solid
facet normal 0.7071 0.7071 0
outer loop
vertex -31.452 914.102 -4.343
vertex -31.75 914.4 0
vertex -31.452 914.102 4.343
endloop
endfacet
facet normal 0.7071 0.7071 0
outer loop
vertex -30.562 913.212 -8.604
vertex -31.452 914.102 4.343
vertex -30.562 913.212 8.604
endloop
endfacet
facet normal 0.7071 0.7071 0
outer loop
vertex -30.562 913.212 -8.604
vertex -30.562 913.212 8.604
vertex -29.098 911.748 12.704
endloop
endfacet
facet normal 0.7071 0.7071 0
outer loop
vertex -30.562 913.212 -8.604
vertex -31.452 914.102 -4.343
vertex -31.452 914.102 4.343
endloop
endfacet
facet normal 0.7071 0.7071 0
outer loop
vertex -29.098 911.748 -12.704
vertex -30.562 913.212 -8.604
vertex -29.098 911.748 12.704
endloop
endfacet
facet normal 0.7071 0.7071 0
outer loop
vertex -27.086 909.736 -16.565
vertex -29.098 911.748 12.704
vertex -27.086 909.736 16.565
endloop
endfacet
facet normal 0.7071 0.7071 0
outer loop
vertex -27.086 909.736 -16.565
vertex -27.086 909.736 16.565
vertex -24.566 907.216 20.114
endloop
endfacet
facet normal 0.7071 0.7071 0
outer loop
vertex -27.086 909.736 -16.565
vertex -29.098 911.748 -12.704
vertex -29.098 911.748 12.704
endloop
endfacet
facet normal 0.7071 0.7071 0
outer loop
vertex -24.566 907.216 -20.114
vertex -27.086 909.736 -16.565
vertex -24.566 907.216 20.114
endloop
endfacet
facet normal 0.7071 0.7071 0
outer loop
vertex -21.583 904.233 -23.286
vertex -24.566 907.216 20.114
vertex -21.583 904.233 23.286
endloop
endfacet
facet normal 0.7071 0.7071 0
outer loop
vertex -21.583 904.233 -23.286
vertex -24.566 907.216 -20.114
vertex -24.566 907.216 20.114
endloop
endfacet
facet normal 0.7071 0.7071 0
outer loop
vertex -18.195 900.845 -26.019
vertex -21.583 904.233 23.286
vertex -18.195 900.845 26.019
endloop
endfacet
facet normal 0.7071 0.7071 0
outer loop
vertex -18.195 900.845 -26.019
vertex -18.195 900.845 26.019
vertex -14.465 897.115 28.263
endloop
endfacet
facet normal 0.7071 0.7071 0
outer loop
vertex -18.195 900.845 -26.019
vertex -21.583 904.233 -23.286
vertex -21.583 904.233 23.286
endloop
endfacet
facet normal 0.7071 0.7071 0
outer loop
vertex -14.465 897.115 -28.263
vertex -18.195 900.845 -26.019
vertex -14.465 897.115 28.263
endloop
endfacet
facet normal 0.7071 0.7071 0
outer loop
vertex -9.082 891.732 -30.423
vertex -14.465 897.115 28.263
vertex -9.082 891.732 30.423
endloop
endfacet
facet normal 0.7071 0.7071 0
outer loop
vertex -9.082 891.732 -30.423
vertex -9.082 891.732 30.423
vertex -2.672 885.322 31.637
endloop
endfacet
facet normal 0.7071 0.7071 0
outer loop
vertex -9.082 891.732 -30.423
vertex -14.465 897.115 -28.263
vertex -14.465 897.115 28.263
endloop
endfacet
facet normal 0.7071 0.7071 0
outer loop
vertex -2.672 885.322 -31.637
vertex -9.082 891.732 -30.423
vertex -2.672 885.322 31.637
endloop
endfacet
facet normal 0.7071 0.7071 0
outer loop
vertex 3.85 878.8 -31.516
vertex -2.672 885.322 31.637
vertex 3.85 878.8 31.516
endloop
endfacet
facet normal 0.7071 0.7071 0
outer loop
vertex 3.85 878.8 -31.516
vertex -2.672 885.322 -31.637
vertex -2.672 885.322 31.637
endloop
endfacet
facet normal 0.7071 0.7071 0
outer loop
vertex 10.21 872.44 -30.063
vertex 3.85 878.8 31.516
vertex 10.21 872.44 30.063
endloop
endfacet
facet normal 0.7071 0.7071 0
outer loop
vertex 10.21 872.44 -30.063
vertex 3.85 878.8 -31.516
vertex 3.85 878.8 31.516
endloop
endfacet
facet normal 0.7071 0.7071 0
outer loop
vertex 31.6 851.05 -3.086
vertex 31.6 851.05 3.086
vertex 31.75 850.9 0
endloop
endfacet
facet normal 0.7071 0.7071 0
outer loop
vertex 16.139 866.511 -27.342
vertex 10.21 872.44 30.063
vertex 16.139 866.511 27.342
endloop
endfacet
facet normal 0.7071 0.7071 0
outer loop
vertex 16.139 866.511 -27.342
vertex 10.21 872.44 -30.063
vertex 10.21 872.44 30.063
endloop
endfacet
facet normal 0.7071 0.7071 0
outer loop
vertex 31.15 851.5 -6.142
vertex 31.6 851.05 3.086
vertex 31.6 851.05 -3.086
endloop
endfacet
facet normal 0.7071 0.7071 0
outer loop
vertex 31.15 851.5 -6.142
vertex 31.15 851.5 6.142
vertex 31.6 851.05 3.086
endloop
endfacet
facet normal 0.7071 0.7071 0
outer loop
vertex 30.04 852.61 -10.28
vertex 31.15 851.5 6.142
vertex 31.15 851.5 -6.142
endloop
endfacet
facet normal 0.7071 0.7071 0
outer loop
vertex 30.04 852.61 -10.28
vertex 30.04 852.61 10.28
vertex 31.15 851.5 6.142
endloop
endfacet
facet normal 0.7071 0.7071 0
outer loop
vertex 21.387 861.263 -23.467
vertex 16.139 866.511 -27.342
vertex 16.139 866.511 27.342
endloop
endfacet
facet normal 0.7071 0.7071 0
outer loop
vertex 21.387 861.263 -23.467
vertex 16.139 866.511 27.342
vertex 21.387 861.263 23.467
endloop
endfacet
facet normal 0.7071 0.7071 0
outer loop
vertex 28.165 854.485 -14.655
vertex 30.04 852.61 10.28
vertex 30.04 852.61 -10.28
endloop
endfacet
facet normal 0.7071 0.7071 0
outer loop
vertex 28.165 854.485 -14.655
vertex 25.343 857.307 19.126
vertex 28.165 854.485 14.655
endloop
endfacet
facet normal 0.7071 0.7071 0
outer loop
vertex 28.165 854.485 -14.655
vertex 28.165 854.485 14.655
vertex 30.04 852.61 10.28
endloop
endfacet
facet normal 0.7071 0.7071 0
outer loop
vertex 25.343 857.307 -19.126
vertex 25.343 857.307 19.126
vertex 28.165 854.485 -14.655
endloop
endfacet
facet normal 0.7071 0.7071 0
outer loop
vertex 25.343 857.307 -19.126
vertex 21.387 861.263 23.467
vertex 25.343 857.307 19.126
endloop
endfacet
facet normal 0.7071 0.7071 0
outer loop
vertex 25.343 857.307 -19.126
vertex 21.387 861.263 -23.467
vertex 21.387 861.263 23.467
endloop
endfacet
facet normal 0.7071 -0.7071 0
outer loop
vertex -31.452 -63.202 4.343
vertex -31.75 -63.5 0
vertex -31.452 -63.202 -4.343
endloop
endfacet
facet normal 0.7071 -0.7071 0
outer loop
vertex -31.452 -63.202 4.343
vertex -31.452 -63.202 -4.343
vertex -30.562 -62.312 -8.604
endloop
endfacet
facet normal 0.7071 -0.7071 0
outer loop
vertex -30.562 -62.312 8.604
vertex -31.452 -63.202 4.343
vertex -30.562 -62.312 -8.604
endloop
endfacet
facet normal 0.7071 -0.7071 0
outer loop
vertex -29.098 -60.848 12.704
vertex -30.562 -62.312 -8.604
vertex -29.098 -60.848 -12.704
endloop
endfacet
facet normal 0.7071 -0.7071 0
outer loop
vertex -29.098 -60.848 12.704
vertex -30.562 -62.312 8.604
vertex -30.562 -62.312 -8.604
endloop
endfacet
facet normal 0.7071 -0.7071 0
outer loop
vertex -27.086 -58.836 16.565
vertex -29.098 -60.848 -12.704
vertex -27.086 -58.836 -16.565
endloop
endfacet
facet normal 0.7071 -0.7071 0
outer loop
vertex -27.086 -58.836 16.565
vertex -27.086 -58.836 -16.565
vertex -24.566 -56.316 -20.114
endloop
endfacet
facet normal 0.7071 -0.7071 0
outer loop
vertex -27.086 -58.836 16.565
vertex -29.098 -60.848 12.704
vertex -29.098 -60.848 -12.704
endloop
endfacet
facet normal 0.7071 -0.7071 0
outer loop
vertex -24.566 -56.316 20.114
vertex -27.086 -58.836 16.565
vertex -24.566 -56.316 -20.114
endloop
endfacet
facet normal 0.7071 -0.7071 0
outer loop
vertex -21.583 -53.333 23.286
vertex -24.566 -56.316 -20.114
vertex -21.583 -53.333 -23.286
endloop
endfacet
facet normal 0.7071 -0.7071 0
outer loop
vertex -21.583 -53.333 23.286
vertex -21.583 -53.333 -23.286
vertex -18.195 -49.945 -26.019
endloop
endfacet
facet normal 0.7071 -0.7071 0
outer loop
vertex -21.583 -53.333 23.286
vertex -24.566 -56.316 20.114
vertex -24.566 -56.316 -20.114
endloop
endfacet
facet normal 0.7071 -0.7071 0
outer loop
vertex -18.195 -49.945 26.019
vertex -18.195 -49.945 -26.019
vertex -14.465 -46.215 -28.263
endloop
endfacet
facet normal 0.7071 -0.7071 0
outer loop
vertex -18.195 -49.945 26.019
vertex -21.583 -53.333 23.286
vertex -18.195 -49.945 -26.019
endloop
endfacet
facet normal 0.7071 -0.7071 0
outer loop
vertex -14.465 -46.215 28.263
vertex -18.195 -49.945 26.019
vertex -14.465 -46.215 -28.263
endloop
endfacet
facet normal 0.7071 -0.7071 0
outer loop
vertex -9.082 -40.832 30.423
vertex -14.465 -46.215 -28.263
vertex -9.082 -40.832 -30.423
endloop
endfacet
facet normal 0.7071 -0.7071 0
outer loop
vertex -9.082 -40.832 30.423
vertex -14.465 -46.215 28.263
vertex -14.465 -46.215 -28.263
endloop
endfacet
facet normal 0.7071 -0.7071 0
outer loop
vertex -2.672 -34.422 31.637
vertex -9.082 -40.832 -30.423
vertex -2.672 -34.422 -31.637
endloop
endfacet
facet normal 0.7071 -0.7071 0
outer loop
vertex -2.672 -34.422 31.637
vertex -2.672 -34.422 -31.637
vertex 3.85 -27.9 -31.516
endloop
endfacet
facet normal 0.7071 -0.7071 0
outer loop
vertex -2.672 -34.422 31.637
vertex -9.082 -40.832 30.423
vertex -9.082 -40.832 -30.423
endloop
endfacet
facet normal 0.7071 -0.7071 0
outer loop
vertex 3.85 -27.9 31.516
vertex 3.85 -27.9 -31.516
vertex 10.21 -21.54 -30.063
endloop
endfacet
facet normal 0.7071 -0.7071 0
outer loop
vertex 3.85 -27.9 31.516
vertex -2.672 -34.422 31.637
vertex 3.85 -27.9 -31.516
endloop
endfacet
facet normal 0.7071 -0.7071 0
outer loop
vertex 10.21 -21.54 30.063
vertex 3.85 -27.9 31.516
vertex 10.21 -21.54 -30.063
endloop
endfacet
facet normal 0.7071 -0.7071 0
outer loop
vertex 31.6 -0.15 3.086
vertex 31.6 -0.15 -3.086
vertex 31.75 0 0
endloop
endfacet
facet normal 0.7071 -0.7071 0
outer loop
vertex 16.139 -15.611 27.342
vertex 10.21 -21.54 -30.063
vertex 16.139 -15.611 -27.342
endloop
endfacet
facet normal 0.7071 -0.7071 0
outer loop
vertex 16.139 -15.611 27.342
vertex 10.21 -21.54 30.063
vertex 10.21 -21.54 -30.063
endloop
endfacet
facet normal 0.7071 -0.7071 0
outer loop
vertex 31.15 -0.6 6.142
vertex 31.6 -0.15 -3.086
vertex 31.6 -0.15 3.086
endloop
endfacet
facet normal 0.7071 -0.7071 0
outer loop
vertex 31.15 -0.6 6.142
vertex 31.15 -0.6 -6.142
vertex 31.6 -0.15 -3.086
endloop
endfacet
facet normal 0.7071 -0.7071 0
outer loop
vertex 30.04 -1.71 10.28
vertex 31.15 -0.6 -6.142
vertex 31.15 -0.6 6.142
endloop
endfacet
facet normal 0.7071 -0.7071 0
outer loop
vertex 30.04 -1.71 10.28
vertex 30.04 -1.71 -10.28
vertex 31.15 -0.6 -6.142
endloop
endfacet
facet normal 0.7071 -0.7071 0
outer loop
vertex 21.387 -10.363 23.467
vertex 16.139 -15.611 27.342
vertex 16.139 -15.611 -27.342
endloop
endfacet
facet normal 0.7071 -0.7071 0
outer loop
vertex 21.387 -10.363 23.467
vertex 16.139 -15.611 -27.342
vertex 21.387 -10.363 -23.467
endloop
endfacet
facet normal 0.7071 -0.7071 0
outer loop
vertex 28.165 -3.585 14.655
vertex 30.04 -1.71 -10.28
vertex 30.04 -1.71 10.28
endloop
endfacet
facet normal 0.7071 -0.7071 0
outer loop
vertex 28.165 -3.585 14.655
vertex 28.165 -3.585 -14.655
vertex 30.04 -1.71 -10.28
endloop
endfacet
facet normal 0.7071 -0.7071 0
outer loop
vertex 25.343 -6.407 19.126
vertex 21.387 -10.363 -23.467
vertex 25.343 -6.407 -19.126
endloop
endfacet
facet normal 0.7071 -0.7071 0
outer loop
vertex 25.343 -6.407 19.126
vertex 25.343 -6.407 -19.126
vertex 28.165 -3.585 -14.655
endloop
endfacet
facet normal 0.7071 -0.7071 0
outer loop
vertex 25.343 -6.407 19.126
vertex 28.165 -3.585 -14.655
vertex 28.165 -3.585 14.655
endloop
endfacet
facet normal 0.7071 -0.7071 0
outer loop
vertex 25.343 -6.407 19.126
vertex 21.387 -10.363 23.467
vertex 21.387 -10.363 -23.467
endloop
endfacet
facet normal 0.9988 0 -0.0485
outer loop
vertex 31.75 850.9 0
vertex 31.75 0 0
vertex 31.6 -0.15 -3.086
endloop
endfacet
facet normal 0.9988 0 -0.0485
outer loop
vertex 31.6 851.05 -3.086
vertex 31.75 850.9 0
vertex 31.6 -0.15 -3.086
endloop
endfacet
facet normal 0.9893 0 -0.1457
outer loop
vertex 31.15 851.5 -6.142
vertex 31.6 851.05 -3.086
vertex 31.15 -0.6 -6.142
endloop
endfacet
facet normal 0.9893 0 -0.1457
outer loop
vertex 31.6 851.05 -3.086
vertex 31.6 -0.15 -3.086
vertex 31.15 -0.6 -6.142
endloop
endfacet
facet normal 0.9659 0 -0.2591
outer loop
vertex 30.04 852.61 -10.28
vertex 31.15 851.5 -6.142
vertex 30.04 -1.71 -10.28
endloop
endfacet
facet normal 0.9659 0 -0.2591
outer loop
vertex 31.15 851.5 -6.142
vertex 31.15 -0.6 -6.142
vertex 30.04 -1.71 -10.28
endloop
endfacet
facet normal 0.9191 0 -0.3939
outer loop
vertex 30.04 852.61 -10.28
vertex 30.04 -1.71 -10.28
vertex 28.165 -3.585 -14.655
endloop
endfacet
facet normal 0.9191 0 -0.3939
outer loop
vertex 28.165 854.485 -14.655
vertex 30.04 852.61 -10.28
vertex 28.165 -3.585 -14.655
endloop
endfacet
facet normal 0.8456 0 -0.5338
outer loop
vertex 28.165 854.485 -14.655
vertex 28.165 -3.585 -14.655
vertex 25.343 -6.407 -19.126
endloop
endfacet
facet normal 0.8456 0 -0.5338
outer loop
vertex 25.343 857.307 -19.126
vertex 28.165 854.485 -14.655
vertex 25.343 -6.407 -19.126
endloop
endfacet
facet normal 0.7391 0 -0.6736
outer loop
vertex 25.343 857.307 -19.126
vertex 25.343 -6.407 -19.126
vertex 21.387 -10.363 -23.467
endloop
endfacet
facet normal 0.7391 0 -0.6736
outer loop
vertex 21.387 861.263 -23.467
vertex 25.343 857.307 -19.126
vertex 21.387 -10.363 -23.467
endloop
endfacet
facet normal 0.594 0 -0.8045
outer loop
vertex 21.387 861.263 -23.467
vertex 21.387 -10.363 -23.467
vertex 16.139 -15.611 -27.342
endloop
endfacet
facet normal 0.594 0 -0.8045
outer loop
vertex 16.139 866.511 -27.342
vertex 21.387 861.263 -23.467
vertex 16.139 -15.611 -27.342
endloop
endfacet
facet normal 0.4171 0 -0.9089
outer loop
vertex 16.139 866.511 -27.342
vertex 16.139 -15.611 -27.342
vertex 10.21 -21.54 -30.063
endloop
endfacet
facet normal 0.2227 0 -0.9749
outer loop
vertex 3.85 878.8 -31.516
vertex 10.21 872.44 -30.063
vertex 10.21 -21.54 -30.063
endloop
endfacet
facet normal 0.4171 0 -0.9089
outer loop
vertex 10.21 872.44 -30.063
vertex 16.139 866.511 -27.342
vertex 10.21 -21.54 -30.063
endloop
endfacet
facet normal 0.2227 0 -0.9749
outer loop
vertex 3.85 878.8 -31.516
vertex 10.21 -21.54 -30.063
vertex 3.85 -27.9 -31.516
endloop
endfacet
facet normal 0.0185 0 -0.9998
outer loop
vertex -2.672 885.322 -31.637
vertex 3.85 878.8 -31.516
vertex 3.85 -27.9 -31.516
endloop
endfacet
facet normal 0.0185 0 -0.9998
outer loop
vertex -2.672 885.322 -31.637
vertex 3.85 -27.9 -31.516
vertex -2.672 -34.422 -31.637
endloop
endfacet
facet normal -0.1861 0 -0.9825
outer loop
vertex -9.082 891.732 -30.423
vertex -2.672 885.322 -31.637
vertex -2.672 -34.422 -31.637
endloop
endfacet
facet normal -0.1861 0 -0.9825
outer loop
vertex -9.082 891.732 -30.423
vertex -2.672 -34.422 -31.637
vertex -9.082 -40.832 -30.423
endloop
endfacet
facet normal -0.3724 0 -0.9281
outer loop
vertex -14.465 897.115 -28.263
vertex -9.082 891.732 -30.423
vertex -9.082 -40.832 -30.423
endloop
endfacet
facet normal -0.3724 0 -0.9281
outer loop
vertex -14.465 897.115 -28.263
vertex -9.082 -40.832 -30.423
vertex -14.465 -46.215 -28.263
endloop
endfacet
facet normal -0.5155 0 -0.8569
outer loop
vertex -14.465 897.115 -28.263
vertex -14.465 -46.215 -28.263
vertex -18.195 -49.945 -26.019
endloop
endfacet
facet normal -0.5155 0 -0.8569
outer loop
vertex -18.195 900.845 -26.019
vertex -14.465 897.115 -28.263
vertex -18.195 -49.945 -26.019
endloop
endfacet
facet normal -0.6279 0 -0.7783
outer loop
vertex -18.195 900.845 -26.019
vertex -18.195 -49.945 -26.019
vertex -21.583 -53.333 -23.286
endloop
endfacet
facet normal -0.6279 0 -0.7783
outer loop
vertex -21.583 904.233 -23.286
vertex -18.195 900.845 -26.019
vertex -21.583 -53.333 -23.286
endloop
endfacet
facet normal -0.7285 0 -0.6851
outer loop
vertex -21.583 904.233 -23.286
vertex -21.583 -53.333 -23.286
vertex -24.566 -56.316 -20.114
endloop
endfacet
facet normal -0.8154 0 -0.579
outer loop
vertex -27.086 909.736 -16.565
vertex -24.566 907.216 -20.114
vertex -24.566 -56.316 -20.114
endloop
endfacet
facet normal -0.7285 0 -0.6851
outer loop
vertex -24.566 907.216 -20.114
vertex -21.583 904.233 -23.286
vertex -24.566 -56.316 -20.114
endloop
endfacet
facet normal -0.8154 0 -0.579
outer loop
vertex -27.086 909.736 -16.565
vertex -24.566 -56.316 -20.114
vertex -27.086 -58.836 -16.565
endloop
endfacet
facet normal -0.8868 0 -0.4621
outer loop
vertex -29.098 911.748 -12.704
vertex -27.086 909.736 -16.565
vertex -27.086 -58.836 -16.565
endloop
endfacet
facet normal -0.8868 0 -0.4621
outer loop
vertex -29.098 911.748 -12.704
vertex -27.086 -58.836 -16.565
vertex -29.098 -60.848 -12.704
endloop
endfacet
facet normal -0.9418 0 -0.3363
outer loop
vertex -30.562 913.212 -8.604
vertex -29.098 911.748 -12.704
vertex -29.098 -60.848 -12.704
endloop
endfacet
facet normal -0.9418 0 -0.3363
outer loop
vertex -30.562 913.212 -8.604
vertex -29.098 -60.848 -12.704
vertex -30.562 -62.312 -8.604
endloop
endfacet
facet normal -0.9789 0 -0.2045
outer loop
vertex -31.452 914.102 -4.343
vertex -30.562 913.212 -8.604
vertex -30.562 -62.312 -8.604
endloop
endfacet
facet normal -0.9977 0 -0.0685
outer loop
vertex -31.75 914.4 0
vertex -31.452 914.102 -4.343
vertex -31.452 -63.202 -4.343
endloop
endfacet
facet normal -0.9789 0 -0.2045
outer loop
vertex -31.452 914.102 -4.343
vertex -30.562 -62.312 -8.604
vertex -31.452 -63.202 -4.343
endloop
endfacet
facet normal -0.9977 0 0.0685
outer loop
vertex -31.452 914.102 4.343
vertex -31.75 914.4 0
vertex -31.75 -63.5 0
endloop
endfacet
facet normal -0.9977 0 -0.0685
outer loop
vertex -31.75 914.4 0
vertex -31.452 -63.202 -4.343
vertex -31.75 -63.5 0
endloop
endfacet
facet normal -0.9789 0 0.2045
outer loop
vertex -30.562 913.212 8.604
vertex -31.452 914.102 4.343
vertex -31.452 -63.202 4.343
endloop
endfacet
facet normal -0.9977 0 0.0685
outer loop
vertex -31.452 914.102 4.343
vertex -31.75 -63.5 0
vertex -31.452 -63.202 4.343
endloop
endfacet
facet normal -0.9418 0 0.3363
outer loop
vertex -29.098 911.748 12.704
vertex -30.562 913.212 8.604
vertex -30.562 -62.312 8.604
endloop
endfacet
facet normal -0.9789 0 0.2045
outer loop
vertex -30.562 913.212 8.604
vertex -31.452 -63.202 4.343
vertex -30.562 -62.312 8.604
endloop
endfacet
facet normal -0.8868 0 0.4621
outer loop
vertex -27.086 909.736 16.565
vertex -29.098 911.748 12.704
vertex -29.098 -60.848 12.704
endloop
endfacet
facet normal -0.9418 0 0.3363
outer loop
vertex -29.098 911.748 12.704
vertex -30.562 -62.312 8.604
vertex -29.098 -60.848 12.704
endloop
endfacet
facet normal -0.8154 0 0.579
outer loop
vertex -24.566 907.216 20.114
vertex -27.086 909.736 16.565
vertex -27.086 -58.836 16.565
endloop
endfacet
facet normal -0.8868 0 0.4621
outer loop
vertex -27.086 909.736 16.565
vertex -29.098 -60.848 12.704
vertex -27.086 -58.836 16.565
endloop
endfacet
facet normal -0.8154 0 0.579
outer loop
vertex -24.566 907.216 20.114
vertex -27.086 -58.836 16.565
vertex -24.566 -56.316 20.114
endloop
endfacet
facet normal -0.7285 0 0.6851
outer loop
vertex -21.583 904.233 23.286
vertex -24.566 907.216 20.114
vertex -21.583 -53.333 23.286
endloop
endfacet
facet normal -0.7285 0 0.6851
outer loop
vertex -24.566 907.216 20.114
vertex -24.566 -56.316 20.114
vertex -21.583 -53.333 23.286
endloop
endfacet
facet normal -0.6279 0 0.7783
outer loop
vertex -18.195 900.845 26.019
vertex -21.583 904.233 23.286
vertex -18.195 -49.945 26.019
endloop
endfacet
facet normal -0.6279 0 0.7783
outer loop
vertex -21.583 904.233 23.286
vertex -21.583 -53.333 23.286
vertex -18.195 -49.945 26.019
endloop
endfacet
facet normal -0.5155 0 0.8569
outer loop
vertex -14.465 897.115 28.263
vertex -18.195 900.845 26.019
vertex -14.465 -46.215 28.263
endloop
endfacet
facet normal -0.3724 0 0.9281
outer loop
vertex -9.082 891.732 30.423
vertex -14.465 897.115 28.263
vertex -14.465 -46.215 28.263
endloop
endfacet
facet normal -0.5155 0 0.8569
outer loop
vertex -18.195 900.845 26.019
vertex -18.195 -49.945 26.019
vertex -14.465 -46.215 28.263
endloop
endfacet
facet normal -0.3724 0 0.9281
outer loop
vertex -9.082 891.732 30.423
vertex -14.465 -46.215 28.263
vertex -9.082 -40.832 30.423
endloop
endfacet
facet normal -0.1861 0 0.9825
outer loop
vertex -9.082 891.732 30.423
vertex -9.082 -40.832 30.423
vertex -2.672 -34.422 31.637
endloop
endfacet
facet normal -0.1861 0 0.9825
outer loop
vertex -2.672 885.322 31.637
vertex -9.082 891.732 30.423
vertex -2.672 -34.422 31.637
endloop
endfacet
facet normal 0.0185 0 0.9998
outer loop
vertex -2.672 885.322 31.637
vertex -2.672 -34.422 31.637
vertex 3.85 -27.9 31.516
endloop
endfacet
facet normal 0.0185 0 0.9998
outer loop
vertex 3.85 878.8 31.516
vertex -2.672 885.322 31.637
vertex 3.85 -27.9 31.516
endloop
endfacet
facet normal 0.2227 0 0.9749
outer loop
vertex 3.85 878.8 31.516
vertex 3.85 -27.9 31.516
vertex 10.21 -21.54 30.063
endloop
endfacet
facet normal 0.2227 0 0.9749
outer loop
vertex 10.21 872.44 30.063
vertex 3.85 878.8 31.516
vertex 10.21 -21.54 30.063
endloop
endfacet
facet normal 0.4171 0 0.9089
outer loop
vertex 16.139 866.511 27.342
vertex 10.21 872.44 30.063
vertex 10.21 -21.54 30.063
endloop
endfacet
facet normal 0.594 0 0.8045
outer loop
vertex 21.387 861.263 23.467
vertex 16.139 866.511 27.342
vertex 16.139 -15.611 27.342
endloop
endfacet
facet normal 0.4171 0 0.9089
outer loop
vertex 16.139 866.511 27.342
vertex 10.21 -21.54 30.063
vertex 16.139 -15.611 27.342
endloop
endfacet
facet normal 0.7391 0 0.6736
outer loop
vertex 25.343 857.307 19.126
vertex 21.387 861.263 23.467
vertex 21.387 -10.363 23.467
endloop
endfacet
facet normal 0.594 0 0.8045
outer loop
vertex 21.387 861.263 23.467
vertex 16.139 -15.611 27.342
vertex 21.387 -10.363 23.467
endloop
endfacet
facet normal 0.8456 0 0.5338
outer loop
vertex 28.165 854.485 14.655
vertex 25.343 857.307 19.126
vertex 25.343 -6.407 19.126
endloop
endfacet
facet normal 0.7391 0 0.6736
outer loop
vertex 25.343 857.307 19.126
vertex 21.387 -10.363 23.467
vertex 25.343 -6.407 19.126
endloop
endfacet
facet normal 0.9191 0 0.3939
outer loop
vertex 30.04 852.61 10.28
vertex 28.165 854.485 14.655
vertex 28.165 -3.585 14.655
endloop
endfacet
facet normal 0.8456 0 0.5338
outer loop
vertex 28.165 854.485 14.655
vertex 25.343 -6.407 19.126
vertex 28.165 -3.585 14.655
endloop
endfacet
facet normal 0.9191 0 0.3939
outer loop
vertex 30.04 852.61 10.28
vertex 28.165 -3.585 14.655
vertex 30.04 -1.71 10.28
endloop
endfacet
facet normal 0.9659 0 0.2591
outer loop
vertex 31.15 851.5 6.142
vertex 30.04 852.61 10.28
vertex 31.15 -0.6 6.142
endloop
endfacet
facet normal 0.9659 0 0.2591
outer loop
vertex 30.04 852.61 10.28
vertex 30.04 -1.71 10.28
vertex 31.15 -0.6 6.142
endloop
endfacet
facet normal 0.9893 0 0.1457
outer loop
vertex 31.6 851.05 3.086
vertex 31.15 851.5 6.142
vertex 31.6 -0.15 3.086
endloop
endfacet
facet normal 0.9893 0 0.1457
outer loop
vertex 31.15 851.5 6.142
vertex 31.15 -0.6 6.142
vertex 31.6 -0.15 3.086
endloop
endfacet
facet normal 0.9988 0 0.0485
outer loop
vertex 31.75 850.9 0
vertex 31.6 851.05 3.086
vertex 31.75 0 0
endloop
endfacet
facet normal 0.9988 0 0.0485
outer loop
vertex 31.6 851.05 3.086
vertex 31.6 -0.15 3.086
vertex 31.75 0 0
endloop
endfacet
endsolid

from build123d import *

# Parameters (mm, degrees)
SKETCH1_R               = 31.75
BOSS_EXTRUDE3_DEPTH     = 850.9
BOSS_EXTRUDE4_START     = -63.5
SKETCH1_3_R             = 31.75
BOSS_EXTRUDE4_DEPTH     = 63.5
SKETCH5_R               = 31.75
BOSS_EXTRUDE5_DEPTH     = 63.5
CUT_EXTRUDE7_DEPTH      = 96.774
CUT_EXTRUDE7_DEPTH_BACK = 96.774


with BuildPart() as part:
    # Sketch1 → Boss-Extrude3 (new body)
    with BuildSketch(Plane(origin=(0, 0, 0), x_dir=(1, 0, 0), z_dir=(0, 1, 0))):
        Circle(SKETCH1_R)
    extrude(amount=BOSS_EXTRUDE3_DEPTH)

    # Sketch1<3> → Boss-Extrude4 (add)
    with BuildSketch(Plane(origin=(0, 0, 0), x_dir=(1, 0, 0), z_dir=(0, 1, 0)).offset(BOSS_EXTRUDE4_START)):
        Circle(SKETCH1_3_R)
    extrude(amount=BOSS_EXTRUDE4_DEPTH)

    # Sketch5 → Boss-Extrude5 (add)
    with BuildSketch(Plane(origin=(0, 850.9, 0), x_dir=(1, 0, 0), z_dir=(0, 1, 0))):
        Circle(SKETCH5_R)
    extrude(amount=BOSS_EXTRUDE5_DEPTH)

    # Sketch2 → Cut-Extrude7 (cut, two sides: drawn at the far end of the back side and taken through both)
    with BuildSketch(Plane.XY.offset(-CUT_EXTRUDE7_DEPTH_BACK)):
        Polygon((-31.75, 914.4), (31.75, 850.9), (31.75, 914.4), align=None)
        Polygon((31.75, -63.5), (31.75, 0), (-31.75, -63.5), align=None)
    extrude(amount=CUT_EXTRUDE7_DEPTH + CUT_EXTRUDE7_DEPTH_BACK, mode=Mode.SUBTRACT)


solid = part.part
